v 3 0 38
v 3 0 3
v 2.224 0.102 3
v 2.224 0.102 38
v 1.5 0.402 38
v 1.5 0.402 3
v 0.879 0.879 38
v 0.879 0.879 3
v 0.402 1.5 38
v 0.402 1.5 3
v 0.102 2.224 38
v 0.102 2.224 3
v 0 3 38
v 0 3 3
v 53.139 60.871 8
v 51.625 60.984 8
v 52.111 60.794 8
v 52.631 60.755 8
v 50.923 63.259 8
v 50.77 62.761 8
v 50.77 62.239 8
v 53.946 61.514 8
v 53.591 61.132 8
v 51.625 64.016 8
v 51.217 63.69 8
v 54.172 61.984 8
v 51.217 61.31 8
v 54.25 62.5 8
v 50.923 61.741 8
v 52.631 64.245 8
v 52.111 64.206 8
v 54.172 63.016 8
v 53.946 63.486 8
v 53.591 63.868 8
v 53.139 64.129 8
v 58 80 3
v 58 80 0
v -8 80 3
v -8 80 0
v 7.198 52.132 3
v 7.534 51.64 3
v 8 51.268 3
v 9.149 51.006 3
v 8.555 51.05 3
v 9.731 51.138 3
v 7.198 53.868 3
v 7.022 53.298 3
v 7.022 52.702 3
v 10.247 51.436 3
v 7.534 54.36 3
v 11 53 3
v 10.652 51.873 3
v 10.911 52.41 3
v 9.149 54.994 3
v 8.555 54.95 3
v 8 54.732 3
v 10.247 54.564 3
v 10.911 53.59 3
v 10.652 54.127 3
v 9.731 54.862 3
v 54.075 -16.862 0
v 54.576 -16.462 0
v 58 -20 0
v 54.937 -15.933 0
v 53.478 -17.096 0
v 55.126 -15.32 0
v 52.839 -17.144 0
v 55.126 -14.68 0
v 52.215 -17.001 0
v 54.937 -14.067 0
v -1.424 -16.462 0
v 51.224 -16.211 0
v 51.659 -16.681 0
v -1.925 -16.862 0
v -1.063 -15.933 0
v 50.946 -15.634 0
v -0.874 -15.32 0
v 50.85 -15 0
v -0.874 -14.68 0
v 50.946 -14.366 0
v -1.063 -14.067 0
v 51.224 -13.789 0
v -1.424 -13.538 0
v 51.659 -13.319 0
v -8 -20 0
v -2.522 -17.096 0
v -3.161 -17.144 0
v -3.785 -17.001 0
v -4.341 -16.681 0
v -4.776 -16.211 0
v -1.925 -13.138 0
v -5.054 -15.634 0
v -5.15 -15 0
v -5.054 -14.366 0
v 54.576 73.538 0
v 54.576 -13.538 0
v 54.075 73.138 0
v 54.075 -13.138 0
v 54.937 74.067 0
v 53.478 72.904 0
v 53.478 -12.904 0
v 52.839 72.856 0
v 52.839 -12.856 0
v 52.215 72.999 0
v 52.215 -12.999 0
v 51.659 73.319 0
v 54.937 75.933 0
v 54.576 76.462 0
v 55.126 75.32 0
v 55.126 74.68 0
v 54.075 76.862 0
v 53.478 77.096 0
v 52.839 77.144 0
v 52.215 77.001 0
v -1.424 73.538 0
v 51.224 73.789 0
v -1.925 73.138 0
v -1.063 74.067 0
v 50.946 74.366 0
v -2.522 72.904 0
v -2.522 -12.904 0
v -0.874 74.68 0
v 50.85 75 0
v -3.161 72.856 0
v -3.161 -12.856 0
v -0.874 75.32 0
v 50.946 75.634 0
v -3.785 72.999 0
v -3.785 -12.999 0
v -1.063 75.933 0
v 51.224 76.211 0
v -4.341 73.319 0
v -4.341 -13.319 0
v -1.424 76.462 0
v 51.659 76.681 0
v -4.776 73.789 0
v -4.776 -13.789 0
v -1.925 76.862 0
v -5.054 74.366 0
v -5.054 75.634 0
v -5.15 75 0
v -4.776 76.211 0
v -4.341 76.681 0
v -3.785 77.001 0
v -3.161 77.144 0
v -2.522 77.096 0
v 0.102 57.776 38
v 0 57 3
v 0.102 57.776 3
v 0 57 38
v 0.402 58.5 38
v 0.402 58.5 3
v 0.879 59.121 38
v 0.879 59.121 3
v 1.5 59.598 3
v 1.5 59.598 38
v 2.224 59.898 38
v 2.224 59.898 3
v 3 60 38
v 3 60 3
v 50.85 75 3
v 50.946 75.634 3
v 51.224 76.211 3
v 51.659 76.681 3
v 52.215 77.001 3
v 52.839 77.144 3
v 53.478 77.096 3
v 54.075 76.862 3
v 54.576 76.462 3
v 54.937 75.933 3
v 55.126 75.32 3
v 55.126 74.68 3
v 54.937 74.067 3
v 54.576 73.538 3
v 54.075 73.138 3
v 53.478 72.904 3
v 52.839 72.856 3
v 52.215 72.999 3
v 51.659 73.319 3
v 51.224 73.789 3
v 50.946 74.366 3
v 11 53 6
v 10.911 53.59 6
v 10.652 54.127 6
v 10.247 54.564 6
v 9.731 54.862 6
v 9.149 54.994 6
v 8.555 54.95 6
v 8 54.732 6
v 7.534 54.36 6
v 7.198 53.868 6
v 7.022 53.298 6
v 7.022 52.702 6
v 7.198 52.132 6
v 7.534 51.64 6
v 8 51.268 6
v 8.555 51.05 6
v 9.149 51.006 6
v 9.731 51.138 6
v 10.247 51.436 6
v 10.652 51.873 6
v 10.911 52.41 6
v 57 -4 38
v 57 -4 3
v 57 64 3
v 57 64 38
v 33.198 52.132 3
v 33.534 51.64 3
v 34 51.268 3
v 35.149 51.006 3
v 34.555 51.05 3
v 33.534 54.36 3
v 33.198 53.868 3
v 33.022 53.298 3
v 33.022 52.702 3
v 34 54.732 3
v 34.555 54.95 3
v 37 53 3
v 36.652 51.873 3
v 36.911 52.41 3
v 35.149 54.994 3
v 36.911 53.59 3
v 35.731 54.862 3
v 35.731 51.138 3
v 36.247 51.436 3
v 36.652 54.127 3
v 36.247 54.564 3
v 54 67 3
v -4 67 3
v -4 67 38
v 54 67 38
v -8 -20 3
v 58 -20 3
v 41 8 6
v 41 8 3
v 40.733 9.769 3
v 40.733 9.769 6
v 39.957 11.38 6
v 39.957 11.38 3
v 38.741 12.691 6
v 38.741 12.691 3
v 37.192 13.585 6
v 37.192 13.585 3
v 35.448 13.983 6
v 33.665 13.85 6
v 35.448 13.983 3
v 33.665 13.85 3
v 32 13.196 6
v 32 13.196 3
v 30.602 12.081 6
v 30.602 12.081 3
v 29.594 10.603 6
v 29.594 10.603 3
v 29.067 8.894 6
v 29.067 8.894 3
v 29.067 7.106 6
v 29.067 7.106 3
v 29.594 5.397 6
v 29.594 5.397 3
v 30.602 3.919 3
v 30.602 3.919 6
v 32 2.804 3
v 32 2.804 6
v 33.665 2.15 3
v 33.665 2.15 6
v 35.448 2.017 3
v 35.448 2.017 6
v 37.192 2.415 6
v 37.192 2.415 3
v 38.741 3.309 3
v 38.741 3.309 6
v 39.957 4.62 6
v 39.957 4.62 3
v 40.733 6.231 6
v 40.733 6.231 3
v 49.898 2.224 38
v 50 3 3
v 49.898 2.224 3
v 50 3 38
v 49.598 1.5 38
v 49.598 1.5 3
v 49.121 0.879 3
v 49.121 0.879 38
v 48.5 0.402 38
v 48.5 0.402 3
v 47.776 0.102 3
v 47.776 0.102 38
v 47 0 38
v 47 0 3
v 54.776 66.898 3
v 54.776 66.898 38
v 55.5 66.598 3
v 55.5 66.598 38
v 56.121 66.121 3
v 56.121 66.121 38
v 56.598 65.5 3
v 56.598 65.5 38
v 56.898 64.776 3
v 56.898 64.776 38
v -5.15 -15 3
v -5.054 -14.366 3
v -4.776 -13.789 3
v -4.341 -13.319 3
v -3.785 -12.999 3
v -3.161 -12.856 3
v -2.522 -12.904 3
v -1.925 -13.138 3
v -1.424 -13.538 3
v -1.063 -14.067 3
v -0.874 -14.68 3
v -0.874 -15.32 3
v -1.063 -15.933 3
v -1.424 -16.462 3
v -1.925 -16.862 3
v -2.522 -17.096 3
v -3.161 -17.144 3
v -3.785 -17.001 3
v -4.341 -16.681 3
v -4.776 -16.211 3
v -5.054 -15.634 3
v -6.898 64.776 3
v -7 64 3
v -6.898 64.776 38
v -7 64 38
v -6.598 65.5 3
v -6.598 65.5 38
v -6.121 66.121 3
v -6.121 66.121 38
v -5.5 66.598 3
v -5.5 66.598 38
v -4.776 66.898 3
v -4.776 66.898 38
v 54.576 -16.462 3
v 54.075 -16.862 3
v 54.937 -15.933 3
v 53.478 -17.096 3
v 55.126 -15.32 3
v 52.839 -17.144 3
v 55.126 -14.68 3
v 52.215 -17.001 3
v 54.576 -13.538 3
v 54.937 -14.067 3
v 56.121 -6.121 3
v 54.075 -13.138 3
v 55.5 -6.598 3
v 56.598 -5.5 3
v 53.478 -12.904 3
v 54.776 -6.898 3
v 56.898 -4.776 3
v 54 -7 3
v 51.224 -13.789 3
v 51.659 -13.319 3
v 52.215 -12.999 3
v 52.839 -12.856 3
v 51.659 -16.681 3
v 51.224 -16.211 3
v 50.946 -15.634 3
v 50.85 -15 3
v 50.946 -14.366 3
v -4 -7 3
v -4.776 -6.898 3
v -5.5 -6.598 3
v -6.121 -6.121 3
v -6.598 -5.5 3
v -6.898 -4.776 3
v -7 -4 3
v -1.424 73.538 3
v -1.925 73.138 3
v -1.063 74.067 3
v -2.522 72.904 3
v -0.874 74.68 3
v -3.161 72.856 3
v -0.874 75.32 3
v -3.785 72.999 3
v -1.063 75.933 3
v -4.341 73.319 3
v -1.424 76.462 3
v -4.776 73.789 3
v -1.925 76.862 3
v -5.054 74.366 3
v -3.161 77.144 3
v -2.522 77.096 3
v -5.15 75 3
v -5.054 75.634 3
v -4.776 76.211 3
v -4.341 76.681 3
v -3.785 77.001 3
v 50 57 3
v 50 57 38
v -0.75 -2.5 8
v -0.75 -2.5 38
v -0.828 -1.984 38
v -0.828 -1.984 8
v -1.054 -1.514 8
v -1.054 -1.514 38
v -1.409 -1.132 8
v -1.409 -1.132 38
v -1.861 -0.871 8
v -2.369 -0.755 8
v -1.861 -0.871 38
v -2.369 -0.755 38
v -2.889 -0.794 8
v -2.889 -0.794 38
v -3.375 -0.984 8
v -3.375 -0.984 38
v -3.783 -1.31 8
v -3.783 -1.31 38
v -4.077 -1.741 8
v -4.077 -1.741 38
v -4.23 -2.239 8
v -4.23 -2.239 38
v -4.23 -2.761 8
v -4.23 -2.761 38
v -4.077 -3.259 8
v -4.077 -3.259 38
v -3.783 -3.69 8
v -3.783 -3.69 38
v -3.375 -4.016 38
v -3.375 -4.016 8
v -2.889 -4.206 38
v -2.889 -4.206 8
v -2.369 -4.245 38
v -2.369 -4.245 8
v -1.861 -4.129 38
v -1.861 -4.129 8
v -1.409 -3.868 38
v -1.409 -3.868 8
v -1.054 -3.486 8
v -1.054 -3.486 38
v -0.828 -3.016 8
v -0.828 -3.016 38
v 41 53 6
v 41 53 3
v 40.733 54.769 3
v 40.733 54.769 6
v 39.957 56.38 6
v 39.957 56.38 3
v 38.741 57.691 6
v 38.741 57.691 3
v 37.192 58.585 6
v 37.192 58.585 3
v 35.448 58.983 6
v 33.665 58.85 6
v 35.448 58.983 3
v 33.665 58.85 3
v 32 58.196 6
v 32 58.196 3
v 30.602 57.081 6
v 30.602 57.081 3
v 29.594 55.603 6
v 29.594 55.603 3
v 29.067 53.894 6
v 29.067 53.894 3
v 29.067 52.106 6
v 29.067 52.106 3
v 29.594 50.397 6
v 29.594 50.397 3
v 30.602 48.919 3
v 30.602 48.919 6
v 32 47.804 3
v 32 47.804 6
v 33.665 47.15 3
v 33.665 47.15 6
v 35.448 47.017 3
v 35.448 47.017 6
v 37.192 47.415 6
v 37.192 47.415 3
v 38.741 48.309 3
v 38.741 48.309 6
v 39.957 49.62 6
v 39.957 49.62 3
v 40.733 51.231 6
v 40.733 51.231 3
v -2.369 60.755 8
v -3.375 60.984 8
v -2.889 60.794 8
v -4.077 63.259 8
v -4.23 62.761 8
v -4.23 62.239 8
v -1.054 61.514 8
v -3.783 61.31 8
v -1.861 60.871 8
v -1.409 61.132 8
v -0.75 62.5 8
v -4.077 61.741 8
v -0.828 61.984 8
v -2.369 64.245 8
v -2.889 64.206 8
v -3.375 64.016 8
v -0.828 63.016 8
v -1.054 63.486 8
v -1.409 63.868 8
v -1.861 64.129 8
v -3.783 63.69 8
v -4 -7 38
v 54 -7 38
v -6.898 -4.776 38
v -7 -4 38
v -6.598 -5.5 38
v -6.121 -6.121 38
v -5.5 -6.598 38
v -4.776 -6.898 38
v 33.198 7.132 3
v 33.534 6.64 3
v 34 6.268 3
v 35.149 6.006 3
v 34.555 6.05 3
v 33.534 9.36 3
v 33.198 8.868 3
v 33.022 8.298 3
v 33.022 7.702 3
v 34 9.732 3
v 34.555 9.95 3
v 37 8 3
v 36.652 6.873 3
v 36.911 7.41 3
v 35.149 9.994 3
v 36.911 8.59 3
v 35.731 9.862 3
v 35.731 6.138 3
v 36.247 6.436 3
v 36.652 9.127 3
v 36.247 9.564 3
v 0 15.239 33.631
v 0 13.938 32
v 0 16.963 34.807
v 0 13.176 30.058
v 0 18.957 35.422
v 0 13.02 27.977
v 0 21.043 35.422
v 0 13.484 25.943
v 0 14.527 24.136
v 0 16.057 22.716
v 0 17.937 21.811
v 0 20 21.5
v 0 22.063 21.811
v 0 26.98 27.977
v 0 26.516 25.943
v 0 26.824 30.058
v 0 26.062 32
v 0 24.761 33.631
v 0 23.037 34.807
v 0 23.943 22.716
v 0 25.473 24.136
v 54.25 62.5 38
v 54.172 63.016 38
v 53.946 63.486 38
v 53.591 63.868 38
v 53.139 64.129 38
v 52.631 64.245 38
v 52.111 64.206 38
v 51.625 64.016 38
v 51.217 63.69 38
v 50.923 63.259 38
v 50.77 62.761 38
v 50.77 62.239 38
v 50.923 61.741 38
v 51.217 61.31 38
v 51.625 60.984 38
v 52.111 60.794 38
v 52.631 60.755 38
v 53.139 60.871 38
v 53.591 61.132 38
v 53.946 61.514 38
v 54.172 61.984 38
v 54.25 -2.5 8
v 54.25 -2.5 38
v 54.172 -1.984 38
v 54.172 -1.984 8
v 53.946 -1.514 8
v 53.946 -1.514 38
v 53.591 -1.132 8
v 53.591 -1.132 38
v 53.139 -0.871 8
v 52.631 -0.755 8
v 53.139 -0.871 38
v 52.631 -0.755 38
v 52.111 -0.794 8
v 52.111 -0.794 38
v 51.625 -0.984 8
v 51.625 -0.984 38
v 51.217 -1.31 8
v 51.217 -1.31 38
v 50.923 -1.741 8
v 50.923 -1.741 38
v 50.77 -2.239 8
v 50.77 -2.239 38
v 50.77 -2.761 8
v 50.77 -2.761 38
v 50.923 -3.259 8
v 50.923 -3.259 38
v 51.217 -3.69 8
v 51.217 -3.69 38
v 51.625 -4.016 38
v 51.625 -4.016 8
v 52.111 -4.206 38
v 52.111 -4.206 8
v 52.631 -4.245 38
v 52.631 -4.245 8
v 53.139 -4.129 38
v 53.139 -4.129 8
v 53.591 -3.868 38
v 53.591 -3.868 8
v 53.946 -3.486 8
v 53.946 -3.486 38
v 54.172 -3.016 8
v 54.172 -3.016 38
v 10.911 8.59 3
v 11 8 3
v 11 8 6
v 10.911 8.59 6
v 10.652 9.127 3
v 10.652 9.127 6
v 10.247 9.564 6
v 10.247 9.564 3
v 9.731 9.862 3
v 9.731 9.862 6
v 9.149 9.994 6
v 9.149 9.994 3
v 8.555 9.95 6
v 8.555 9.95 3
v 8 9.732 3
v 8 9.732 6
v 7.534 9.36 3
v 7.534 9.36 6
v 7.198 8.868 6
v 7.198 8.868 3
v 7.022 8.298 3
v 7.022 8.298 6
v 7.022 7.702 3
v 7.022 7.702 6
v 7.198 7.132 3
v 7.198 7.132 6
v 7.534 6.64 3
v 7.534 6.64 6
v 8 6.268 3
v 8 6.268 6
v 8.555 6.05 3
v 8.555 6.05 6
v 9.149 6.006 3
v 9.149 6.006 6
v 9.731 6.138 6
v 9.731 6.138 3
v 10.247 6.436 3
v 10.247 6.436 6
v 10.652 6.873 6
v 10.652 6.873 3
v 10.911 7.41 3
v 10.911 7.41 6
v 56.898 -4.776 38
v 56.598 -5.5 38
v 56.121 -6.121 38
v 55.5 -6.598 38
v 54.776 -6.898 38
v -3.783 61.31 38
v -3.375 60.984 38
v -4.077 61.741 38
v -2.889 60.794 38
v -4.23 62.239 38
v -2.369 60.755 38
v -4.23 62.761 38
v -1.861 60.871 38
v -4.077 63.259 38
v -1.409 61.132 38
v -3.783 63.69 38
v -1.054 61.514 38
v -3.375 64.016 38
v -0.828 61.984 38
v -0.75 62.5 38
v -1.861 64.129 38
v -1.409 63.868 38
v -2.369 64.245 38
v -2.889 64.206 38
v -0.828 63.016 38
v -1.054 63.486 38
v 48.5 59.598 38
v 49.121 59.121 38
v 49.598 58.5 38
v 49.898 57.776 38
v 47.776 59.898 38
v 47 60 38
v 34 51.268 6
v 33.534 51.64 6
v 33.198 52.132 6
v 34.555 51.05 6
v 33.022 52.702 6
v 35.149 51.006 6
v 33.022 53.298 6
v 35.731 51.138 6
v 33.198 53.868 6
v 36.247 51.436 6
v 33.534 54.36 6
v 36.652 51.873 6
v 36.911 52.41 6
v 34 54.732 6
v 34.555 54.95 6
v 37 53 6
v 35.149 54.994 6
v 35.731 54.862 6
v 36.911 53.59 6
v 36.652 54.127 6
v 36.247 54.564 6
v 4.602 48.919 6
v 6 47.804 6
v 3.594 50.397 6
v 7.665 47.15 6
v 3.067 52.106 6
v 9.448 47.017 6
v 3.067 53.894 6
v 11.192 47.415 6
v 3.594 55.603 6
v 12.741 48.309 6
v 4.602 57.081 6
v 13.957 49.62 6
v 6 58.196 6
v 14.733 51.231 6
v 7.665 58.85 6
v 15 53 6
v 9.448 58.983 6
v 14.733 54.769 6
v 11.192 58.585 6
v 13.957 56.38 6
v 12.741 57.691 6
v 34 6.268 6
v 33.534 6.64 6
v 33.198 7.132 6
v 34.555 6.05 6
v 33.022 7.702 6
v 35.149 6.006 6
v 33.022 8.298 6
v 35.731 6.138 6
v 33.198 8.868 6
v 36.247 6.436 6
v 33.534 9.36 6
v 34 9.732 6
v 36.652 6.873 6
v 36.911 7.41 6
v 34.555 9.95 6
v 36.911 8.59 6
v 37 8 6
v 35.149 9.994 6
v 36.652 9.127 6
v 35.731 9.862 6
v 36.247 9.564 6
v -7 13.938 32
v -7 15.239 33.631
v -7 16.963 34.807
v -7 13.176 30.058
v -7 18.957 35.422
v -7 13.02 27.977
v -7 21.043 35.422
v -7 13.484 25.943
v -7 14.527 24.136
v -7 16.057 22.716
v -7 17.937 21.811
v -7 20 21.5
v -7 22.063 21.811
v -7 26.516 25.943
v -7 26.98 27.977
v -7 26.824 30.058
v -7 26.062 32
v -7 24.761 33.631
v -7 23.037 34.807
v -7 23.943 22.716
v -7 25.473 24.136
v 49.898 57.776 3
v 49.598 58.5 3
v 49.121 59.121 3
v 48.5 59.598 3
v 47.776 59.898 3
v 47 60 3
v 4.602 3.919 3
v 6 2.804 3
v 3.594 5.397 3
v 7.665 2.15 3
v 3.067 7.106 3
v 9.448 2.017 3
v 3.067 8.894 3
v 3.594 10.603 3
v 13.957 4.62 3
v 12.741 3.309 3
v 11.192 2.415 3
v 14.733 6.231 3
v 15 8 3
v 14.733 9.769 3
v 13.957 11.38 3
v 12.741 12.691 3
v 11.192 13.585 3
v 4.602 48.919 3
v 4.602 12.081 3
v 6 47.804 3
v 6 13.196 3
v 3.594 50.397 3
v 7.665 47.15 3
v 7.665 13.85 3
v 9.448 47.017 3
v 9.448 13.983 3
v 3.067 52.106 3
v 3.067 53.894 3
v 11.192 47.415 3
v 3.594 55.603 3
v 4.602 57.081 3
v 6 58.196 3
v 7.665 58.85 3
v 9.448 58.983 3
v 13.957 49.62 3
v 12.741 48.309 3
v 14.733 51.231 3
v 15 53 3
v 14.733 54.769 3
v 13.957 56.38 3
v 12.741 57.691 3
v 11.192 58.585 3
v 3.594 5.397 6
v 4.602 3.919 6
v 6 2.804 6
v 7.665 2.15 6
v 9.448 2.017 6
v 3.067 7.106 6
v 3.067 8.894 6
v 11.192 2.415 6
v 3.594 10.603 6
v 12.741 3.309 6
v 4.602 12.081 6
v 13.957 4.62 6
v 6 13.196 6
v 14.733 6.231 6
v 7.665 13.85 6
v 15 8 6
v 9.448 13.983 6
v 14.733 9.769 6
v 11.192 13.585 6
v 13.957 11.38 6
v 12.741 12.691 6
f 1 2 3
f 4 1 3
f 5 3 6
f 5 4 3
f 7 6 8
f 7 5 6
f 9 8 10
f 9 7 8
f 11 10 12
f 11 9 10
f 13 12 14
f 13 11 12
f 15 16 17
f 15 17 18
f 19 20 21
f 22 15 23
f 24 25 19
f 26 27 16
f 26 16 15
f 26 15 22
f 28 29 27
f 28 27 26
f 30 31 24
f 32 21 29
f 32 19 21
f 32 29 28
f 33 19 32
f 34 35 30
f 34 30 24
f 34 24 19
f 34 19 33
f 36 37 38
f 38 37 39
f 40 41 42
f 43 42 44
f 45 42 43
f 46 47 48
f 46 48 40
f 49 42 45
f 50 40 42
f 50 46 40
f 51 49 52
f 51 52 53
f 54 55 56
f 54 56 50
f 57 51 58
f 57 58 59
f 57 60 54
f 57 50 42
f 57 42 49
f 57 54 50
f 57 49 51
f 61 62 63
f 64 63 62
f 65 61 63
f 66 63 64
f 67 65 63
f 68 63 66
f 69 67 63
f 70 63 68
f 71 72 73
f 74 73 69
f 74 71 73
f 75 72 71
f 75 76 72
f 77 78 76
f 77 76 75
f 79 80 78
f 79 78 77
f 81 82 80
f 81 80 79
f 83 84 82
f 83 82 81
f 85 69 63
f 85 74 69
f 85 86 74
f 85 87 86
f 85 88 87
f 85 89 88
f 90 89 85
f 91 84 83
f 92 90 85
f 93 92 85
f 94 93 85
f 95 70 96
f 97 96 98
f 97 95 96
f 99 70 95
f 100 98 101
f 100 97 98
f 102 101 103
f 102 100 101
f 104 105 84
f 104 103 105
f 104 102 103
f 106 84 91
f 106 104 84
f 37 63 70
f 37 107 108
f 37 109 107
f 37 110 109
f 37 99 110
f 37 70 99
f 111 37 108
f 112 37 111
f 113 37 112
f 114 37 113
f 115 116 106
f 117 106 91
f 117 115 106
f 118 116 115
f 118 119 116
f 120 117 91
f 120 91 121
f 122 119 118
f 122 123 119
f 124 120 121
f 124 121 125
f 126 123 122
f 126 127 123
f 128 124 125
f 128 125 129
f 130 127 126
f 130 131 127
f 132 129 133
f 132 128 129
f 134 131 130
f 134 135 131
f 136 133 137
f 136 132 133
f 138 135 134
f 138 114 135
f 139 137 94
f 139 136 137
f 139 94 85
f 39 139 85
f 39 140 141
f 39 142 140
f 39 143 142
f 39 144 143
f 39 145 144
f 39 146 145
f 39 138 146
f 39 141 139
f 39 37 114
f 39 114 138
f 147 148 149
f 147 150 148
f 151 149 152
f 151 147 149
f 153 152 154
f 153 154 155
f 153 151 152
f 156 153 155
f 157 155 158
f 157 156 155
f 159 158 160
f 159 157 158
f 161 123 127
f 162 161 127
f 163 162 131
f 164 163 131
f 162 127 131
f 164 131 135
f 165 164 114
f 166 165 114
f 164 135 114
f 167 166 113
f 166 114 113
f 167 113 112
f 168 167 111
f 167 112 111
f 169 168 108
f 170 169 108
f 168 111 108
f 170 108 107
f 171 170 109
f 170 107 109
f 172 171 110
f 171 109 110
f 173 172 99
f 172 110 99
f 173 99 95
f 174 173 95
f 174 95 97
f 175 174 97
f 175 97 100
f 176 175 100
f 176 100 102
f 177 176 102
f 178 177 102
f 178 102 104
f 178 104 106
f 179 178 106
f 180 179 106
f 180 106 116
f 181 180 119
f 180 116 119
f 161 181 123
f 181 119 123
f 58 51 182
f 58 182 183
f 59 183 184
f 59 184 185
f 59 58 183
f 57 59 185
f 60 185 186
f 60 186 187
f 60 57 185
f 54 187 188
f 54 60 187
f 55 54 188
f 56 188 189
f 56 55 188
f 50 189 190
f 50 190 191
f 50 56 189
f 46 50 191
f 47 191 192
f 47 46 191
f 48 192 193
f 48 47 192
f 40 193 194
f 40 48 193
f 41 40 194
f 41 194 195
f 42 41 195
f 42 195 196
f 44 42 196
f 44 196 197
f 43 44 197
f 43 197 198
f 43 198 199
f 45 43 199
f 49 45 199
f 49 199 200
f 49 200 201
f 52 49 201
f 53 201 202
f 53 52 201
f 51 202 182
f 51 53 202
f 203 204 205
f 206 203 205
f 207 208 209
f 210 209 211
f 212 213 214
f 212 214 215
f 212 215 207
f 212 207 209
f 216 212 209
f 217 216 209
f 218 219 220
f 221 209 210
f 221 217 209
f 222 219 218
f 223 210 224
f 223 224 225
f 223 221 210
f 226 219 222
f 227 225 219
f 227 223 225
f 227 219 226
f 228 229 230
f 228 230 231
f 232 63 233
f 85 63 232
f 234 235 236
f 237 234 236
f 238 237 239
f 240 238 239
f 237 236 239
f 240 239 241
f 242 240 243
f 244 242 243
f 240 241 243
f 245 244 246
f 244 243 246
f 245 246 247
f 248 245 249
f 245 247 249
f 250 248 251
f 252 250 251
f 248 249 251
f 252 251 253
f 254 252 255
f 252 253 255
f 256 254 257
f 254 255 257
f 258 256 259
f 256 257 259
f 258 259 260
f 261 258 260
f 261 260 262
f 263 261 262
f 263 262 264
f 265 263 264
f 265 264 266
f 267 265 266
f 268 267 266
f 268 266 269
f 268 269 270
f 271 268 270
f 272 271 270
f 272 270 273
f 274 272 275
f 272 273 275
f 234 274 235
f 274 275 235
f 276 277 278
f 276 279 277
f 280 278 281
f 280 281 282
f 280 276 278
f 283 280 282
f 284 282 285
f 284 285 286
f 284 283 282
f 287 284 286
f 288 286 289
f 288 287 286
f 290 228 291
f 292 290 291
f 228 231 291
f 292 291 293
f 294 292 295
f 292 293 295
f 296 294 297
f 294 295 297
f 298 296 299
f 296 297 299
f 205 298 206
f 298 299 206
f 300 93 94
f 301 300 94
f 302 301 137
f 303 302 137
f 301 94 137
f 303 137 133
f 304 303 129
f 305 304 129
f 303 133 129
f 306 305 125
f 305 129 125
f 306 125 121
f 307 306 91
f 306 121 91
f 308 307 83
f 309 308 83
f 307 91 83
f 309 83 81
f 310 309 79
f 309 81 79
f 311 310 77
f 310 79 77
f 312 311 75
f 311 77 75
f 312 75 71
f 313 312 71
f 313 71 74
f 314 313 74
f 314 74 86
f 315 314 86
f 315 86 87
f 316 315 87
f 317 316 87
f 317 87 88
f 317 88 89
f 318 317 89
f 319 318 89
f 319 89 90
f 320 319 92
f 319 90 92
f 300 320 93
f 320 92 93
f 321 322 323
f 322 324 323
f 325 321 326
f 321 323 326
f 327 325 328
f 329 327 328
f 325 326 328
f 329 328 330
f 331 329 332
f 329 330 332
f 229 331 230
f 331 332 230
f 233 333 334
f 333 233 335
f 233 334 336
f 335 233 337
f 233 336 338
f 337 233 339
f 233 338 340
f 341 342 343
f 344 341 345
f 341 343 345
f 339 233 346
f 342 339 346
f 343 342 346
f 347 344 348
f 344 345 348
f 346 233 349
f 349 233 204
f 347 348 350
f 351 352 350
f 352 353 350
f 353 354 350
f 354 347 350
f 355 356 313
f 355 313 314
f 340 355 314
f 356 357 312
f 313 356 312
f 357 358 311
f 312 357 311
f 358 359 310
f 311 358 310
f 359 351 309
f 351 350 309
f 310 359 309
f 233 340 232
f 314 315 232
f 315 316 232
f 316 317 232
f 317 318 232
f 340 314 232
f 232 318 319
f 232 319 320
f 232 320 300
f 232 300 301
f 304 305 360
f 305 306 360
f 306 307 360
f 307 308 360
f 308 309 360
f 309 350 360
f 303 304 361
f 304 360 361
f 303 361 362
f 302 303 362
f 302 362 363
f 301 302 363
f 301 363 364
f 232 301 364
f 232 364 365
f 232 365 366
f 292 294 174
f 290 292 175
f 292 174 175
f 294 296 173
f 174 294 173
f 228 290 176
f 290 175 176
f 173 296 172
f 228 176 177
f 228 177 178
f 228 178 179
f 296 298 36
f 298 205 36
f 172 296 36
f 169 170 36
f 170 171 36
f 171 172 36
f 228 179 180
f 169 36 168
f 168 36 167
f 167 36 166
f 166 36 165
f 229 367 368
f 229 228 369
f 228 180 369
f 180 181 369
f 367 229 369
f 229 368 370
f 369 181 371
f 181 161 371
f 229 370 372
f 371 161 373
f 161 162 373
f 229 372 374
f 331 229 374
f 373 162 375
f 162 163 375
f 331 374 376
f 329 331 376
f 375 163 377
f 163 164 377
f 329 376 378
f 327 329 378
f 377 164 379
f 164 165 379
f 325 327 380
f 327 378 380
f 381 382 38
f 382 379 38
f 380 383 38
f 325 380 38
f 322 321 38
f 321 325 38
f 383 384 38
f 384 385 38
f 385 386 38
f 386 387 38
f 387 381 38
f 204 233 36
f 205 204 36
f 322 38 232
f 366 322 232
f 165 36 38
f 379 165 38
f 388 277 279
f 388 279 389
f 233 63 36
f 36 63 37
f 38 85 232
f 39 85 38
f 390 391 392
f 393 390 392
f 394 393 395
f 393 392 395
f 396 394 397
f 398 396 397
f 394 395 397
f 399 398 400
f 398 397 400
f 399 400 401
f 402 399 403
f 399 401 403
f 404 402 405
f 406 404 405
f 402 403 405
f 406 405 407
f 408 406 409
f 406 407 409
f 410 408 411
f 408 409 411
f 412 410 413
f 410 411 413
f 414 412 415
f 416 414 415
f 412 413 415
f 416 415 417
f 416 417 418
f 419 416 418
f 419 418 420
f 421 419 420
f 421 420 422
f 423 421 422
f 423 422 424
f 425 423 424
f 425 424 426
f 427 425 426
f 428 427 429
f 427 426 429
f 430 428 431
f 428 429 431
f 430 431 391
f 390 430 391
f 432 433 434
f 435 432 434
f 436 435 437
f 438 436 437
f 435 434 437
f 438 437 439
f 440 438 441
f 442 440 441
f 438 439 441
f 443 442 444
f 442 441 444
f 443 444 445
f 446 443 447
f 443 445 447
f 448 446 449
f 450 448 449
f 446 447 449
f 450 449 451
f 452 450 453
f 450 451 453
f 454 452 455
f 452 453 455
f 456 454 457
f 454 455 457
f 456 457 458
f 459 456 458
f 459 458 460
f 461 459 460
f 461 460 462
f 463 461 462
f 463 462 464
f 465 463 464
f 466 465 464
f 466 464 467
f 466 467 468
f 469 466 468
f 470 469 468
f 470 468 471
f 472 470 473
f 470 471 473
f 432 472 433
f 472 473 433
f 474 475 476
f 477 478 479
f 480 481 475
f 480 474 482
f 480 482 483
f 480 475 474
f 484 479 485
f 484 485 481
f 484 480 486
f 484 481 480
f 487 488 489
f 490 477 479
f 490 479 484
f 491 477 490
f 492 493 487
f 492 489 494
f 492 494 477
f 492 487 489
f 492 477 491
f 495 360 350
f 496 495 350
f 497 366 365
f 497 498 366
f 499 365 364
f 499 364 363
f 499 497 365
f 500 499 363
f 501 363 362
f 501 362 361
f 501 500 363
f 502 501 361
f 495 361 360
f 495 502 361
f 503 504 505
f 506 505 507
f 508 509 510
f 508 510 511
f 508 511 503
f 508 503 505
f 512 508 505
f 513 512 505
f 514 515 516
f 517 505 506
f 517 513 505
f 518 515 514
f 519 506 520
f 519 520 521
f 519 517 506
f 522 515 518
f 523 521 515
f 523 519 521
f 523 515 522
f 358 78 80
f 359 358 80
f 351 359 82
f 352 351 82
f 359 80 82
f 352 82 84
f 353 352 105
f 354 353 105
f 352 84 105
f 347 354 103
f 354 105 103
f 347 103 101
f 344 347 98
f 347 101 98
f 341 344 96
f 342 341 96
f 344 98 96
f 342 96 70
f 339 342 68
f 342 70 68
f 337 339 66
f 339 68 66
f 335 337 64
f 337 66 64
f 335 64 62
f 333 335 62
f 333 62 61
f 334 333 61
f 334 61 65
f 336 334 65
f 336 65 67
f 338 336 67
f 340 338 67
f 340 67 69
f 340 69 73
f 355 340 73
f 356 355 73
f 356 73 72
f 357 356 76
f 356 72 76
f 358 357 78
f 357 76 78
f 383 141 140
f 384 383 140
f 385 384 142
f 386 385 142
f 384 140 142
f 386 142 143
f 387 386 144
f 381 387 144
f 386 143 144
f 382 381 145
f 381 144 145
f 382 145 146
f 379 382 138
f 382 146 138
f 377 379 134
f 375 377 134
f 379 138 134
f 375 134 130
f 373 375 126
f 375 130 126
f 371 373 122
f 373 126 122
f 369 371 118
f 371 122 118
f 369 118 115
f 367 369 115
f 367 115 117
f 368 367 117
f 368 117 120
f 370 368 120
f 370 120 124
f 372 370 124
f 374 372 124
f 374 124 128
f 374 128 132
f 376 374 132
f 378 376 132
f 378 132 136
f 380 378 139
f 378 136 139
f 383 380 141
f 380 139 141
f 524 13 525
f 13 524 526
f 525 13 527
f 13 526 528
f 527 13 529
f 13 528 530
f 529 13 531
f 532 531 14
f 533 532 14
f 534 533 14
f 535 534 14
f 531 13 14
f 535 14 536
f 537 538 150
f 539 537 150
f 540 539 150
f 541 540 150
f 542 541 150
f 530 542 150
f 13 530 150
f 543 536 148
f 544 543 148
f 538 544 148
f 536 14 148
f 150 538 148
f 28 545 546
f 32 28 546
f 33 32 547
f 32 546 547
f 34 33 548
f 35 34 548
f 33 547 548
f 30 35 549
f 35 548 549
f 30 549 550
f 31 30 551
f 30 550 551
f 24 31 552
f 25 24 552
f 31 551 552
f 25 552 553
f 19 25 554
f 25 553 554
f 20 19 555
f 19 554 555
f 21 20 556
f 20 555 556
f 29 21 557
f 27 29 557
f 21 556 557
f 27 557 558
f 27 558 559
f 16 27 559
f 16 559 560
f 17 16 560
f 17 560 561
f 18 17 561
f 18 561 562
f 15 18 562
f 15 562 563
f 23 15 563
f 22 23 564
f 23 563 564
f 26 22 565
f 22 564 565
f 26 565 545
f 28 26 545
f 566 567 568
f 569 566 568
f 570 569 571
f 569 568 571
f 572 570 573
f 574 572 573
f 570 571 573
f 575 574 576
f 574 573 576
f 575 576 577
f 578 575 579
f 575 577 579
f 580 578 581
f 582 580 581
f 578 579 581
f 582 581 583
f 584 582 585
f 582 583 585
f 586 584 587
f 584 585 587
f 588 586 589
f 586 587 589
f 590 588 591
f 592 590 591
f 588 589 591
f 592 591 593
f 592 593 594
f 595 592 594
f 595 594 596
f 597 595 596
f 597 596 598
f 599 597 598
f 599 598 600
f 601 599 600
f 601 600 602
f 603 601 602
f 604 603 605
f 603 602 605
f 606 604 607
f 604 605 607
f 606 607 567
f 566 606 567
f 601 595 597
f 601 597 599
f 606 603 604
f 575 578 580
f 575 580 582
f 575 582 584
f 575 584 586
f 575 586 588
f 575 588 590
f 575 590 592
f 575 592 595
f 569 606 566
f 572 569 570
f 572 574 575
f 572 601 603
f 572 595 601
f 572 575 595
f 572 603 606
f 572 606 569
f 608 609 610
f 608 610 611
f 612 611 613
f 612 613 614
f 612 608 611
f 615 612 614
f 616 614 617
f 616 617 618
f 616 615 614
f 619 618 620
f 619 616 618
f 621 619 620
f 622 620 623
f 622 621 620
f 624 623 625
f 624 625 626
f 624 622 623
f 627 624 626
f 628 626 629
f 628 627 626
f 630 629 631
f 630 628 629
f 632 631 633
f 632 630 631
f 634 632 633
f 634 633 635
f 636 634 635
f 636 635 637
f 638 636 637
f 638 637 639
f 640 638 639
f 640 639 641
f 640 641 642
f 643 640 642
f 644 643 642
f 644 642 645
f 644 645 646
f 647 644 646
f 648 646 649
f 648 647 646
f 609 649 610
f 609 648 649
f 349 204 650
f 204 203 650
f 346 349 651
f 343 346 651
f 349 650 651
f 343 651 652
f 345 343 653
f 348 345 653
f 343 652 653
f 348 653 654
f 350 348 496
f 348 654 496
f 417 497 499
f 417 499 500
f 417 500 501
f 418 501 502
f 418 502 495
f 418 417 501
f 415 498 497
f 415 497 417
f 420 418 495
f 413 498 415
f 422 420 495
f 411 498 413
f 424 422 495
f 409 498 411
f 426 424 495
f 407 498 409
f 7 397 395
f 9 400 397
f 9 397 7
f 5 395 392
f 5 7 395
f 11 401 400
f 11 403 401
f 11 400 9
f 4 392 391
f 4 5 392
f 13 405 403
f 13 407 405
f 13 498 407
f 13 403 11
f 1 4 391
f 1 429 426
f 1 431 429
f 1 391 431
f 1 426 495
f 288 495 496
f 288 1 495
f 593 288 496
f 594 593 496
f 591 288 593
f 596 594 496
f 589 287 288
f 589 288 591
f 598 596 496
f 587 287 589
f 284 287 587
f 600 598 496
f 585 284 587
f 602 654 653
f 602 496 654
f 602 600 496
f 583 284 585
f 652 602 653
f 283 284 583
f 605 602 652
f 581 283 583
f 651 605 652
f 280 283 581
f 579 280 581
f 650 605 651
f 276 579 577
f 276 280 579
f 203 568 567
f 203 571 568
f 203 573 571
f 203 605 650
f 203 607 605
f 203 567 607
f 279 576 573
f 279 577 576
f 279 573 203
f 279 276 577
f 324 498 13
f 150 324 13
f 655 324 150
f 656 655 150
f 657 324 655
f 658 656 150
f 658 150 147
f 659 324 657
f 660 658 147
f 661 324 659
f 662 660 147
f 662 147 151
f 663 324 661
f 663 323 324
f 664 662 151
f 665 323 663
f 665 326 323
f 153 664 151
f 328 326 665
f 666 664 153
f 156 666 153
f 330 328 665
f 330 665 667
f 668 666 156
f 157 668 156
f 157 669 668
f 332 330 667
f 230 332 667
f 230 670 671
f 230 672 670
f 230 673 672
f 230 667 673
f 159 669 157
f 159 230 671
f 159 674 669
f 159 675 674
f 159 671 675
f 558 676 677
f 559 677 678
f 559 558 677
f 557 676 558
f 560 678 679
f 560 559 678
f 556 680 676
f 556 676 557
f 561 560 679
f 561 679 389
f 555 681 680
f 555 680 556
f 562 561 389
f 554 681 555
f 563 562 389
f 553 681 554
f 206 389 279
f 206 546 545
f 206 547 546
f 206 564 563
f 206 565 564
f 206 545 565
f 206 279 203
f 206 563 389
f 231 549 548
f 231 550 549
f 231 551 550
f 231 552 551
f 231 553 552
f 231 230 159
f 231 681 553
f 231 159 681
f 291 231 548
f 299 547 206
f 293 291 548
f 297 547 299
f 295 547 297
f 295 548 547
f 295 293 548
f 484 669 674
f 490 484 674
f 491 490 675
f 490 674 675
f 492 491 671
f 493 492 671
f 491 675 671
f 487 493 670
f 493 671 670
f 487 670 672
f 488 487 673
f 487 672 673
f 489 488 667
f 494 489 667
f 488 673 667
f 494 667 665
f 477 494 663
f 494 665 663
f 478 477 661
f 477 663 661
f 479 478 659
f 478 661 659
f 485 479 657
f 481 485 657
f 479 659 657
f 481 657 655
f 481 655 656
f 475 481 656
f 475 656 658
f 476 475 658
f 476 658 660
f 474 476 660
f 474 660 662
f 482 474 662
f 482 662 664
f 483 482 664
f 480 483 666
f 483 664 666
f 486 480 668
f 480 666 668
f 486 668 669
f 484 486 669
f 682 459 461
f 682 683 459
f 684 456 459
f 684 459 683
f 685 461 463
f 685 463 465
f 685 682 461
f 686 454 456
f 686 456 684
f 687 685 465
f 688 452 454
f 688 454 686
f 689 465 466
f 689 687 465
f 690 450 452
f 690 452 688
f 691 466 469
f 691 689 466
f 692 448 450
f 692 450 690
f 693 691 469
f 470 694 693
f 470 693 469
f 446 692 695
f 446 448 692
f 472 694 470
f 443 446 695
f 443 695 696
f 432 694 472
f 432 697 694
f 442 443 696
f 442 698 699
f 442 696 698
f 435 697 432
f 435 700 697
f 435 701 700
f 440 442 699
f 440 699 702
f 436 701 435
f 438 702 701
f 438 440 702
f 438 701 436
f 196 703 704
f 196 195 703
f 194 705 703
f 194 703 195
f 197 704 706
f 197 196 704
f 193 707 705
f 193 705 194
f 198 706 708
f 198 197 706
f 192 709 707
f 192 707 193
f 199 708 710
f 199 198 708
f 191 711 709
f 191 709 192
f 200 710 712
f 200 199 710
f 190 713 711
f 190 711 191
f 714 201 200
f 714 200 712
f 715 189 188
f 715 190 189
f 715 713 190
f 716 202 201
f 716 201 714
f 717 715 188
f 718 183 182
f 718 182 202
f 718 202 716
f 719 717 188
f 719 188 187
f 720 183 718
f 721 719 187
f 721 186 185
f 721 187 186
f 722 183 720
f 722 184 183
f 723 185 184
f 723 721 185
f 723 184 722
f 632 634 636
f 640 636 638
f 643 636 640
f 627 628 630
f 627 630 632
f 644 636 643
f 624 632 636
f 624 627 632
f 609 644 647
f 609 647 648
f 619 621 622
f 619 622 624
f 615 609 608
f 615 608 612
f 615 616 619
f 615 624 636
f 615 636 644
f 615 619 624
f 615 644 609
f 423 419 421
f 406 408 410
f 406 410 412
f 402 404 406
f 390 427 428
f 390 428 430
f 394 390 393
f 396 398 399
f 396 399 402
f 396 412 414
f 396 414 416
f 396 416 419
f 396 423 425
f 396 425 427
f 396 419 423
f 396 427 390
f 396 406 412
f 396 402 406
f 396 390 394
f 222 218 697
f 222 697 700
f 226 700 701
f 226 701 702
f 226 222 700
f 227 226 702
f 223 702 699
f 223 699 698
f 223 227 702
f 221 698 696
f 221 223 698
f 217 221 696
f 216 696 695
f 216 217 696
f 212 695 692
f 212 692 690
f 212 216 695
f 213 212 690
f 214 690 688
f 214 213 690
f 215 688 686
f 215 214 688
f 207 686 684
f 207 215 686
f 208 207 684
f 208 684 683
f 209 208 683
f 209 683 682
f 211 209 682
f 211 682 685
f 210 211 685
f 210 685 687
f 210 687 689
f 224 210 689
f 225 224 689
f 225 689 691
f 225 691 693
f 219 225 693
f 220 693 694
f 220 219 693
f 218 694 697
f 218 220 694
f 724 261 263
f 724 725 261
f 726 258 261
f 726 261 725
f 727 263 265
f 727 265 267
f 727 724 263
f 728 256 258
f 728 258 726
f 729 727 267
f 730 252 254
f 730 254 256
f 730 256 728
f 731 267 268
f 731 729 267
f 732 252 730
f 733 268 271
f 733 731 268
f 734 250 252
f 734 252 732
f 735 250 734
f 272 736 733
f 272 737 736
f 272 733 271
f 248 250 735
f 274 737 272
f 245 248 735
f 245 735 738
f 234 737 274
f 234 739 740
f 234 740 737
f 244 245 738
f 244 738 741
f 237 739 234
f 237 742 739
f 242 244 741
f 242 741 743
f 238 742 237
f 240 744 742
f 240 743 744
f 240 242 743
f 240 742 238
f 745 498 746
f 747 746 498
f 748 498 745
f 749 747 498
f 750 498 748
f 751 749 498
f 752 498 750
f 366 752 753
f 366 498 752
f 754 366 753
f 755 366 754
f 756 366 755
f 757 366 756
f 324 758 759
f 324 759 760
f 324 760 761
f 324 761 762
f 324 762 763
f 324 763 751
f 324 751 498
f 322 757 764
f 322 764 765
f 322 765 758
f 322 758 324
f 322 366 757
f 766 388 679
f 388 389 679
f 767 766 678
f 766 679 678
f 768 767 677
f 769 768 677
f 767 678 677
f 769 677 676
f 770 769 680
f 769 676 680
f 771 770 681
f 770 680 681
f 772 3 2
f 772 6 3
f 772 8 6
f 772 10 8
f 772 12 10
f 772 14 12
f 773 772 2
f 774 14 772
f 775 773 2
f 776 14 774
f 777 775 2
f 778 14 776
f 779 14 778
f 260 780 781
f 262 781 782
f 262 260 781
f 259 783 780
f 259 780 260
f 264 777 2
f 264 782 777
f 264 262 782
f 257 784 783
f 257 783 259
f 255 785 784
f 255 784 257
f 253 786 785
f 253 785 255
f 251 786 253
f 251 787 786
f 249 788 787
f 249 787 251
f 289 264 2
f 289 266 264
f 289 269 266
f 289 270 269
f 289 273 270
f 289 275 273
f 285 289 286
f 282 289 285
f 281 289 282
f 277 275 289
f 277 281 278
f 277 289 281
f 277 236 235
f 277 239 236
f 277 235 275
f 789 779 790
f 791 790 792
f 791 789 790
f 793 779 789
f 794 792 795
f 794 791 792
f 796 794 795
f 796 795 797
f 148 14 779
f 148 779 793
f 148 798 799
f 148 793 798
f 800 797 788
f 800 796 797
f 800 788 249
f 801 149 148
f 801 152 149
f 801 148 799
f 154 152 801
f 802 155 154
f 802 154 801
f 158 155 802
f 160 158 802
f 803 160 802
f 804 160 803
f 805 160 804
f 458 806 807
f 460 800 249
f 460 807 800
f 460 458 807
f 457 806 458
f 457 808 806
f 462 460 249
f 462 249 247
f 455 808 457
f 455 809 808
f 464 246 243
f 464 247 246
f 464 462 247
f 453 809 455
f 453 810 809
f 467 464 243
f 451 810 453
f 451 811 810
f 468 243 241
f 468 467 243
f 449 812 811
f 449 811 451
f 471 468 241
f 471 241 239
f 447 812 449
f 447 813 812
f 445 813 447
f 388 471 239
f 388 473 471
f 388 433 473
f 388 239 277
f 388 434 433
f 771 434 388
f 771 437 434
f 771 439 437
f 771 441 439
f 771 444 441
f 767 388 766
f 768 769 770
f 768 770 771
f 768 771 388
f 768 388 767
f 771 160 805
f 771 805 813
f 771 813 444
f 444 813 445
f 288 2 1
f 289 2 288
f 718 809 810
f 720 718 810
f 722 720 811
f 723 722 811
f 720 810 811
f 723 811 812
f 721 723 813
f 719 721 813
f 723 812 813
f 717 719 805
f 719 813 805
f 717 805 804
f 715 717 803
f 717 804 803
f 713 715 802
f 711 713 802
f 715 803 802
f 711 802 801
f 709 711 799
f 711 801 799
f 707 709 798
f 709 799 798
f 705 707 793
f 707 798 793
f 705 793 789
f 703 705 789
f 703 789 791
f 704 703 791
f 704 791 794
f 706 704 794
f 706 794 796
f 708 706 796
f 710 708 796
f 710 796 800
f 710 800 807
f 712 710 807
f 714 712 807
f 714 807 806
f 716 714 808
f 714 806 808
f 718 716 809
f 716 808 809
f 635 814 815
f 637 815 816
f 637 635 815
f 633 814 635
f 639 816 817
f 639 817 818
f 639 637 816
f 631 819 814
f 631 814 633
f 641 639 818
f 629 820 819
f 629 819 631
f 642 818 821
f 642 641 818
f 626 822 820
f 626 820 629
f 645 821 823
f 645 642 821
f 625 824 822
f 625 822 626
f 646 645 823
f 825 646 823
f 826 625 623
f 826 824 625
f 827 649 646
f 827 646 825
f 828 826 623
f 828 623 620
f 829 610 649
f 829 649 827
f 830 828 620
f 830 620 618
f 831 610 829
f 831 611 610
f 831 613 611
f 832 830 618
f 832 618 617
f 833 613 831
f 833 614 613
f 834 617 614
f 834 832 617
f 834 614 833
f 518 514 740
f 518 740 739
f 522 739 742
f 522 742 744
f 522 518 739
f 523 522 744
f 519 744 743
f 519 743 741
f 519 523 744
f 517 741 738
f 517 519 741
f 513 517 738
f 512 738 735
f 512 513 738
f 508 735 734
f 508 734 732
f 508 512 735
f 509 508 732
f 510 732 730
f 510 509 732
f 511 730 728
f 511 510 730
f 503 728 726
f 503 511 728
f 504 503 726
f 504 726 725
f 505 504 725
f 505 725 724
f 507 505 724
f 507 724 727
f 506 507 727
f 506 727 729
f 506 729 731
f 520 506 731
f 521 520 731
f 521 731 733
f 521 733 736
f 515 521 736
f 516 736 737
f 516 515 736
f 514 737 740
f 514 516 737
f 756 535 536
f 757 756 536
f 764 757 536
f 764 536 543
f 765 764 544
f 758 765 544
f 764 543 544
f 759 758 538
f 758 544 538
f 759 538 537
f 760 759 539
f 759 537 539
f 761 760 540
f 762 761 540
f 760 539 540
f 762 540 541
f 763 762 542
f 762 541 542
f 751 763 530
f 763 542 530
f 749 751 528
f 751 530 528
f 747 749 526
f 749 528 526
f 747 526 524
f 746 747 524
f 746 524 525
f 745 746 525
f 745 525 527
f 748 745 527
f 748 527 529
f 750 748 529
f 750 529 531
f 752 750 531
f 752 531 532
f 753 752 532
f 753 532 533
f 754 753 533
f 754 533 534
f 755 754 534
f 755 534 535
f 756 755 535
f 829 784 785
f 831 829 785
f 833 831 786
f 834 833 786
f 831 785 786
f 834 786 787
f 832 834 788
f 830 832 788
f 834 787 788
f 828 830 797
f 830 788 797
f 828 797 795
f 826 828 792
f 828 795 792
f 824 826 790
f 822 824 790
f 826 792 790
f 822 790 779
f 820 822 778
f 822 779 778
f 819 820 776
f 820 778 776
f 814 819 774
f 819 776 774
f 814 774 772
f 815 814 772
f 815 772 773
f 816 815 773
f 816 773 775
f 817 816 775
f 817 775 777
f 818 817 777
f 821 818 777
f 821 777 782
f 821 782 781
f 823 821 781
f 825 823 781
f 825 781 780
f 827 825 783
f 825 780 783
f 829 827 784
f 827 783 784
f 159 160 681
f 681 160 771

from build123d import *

# Parameters (mm, degrees)
SKICA1_W                    = 50
SKICA1_H                    = 60
P_IDAT_VYSUNUT_M2_DEPTH     = 3
SKICA3_W                    = 64
SKICA3_H                    = 74
SKICA3_W_2                  = 50
SKICA3_H_2                  = 60
VYSUNOUT_TENKOST_NN_1_DEPTH = 35
SKICA4_W                    = 66
SKICA4_H                    = 100
SKICA4_R                    = 2.15
SKICA4_W_2                  = 50
SKICA4_H_2                  = 60
P_IDAT_VYSUNUT_M5_DEPTH     = 3
SKICA2_R                    = 6
SKICA2_R_2                  = 2
VYSUNOUT_TENKOST_NN_2_DEPTH = 3
ZAOBLIT2_R                  = 3
ODEBRAT_VYSUNUT_M3_REACH    = 107.868
SKICA9_R                    = 7
ZAOBLIT4_R                  = 3
ZAOBLIT5_R                  = 3
ZAOBLIT6_R                  = 3
ZAOBLIT7_R                  = 3
SKICA10_R                   = 1.75
ODEBRAT_VYSUNUT_M4_DEPTH    = 30


with BuildPart() as part:
    # Skica1 → Přidat vysunutím2 (new body)
    with BuildSketch(Plane.XY):
        with Locations((25, 30)):
            Rectangle(SKICA1_W, SKICA1_H)
    extrude(amount=P_IDAT_VYSUNUT_M2_DEPTH)



with BuildPart() as body_2:
    # Skica3 → Vysunout tenkostěnný1 (new body)
    with BuildSketch(Plane.XY.offset(3)):
        with Locations((25, 30)):
            Rectangle(SKICA3_W, SKICA3_H)
        with Locations((25, 30)):
            Rectangle(SKICA3_W_2, SKICA3_H_2, mode=Mode.SUBTRACT)
    extrude(amount=VYSUNOUT_TENKOST_NN_1_DEPTH)


with BuildPart() as part_1:
    add(part.part)

    add(body_2.part)  # Přidat vysunutím5 merges body 2
    # Skica4 → Přidat vysunutím5 (add)
    with BuildSketch(Plane(origin=(0, 0, 0), x_dir=(-1, 0, 0), z_dir=(0, 0, -1))):
        with Locations((-25, 30)):
            Rectangle(SKICA4_W, SKICA4_H)
        with Locations((-53, 75)):
            Circle(SKICA4_R, mode=Mode.SUBTRACT)
        with Locations((3, 75)):
            Circle(SKICA4_R, mode=Mode.SUBTRACT)
        with Locations((3, -15)):
            Circle(SKICA4_R, mode=Mode.SUBTRACT)
        with Locations((-53, -15)):
            Circle(SKICA4_R, mode=Mode.SUBTRACT)
        with Locations((-25, 30)):
            Rectangle(SKICA4_W_2, SKICA4_H_2, mode=Mode.SUBTRACT)
    extrude(amount=-P_IDAT_VYSUNUT_M5_DEPTH)

    # Skica2 → Vysunout tenkostěnný2 (add)
    # profile 1 of 4: a face of its own
    with BuildSketch(Plane.XY.offset(3)):
        with Locations((9, 53)):
            Circle(SKICA2_R)
        with Locations((9, 53)):
            Circle(SKICA2_R_2, mode=Mode.SUBTRACT)
    # profile 2 of 4: a face of its own
    with BuildSketch(Plane.XY.offset(3)):
        with Locations((35, 53)):
            Circle(SKICA2_R)
        with Locations((35, 53)):
            Circle(SKICA2_R_2, mode=Mode.SUBTRACT)
    # profile 3 of 4: a face of its own
    with BuildSketch(Plane.XY.offset(3)):
        with Locations((35, 8)):
            Circle(SKICA2_R)
        with Locations((35, 8)):
            Circle(SKICA2_R_2, mode=Mode.SUBTRACT)
    # profile 4 of 4: a face of its own
    with BuildSketch(Plane.XY.offset(3)):
        with Locations((9, 8)):
            Circle(SKICA2_R)
        with Locations((9, 8)):
            Circle(SKICA2_R_2, mode=Mode.SUBTRACT)
    extrude(amount=VYSUNOUT_TENKOST_NN_2_DEPTH)

    # Zaoblit2
    zaoblit2_edges = [part_1.edges().sort_by_distance(p)[0] for p in [
        (-7, 67, 20.5),
        (-7, -7, 20.5),
        (57, -7, 20.5),
        (57, 67, 20.5),
    ]]
    fillet(zaoblit2_edges, radius=ZAOBLIT2_R)

    # Skica9 → Odebrat vysunutím3 (cut, up to next)
    with BuildSketch(Plane(origin=(0, 0, 0), x_dir=(0, 0, -1), z_dir=(1, 0, 0)), mode=Mode.PRIVATE) as odebrat_vysunut_m3_sk1:
        with Locations((-28.5, 20)):
            Circle(SKICA9_R)
    odebrat_vysunut_m3_tool1 = extrude(odebrat_vysunut_m3_sk1.sketch, amount=-ODEBRAT_VYSUNUT_M3_REACH, mode=Mode.PRIVATE) & part_1.part
    add(odebrat_vysunut_m3_tool1.solids().sort_by_distance((0, 20, 28.5))[0], mode=Mode.SUBTRACT)

    # Zaoblit4
    zaoblit4_edges = [part_1.edges().sort_by_distance(p)[0] for p in [
        (50, 60, 20.5),
    ]]
    fillet(zaoblit4_edges, radius=ZAOBLIT4_R)

    # Zaoblit5
    zaoblit5_edges = [part_1.edges().sort_by_distance(p)[0] for p in [
        (50, 0, 20.5),
    ]]
    fillet(zaoblit5_edges, radius=ZAOBLIT5_R)

    # Zaoblit6
    zaoblit6_edges = [part_1.edges().sort_by_distance(p)[0] for p in [
        (0, 0, 20.5),
    ]]
    fillet(zaoblit6_edges, radius=ZAOBLIT6_R)

    # Zaoblit7
    zaoblit7_edges = [part_1.edges().sort_by_distance(p)[0] for p in [
        (0, 60, 20.5),
    ]]
    fillet(zaoblit7_edges, radius=ZAOBLIT7_R)

    # Skica10 → Odebrat vysunutím4 (cut)
    with BuildSketch(Plane.XY.offset(38)):
        with Locations((-2.5, 62.5)):
            Circle(SKICA10_R)
        with Locations((52.5, 62.5)):
            Circle(SKICA10_R)
        with Locations((52.5, -2.5)):
            Circle(SKICA10_R)
        with Locations((-2.5, -2.5)):
            Circle(SKICA10_R)
    extrude(amount=-ODEBRAT_VYSUNUT_M4_DEPTH, mode=Mode.SUBTRACT)


solid = part_1.part
